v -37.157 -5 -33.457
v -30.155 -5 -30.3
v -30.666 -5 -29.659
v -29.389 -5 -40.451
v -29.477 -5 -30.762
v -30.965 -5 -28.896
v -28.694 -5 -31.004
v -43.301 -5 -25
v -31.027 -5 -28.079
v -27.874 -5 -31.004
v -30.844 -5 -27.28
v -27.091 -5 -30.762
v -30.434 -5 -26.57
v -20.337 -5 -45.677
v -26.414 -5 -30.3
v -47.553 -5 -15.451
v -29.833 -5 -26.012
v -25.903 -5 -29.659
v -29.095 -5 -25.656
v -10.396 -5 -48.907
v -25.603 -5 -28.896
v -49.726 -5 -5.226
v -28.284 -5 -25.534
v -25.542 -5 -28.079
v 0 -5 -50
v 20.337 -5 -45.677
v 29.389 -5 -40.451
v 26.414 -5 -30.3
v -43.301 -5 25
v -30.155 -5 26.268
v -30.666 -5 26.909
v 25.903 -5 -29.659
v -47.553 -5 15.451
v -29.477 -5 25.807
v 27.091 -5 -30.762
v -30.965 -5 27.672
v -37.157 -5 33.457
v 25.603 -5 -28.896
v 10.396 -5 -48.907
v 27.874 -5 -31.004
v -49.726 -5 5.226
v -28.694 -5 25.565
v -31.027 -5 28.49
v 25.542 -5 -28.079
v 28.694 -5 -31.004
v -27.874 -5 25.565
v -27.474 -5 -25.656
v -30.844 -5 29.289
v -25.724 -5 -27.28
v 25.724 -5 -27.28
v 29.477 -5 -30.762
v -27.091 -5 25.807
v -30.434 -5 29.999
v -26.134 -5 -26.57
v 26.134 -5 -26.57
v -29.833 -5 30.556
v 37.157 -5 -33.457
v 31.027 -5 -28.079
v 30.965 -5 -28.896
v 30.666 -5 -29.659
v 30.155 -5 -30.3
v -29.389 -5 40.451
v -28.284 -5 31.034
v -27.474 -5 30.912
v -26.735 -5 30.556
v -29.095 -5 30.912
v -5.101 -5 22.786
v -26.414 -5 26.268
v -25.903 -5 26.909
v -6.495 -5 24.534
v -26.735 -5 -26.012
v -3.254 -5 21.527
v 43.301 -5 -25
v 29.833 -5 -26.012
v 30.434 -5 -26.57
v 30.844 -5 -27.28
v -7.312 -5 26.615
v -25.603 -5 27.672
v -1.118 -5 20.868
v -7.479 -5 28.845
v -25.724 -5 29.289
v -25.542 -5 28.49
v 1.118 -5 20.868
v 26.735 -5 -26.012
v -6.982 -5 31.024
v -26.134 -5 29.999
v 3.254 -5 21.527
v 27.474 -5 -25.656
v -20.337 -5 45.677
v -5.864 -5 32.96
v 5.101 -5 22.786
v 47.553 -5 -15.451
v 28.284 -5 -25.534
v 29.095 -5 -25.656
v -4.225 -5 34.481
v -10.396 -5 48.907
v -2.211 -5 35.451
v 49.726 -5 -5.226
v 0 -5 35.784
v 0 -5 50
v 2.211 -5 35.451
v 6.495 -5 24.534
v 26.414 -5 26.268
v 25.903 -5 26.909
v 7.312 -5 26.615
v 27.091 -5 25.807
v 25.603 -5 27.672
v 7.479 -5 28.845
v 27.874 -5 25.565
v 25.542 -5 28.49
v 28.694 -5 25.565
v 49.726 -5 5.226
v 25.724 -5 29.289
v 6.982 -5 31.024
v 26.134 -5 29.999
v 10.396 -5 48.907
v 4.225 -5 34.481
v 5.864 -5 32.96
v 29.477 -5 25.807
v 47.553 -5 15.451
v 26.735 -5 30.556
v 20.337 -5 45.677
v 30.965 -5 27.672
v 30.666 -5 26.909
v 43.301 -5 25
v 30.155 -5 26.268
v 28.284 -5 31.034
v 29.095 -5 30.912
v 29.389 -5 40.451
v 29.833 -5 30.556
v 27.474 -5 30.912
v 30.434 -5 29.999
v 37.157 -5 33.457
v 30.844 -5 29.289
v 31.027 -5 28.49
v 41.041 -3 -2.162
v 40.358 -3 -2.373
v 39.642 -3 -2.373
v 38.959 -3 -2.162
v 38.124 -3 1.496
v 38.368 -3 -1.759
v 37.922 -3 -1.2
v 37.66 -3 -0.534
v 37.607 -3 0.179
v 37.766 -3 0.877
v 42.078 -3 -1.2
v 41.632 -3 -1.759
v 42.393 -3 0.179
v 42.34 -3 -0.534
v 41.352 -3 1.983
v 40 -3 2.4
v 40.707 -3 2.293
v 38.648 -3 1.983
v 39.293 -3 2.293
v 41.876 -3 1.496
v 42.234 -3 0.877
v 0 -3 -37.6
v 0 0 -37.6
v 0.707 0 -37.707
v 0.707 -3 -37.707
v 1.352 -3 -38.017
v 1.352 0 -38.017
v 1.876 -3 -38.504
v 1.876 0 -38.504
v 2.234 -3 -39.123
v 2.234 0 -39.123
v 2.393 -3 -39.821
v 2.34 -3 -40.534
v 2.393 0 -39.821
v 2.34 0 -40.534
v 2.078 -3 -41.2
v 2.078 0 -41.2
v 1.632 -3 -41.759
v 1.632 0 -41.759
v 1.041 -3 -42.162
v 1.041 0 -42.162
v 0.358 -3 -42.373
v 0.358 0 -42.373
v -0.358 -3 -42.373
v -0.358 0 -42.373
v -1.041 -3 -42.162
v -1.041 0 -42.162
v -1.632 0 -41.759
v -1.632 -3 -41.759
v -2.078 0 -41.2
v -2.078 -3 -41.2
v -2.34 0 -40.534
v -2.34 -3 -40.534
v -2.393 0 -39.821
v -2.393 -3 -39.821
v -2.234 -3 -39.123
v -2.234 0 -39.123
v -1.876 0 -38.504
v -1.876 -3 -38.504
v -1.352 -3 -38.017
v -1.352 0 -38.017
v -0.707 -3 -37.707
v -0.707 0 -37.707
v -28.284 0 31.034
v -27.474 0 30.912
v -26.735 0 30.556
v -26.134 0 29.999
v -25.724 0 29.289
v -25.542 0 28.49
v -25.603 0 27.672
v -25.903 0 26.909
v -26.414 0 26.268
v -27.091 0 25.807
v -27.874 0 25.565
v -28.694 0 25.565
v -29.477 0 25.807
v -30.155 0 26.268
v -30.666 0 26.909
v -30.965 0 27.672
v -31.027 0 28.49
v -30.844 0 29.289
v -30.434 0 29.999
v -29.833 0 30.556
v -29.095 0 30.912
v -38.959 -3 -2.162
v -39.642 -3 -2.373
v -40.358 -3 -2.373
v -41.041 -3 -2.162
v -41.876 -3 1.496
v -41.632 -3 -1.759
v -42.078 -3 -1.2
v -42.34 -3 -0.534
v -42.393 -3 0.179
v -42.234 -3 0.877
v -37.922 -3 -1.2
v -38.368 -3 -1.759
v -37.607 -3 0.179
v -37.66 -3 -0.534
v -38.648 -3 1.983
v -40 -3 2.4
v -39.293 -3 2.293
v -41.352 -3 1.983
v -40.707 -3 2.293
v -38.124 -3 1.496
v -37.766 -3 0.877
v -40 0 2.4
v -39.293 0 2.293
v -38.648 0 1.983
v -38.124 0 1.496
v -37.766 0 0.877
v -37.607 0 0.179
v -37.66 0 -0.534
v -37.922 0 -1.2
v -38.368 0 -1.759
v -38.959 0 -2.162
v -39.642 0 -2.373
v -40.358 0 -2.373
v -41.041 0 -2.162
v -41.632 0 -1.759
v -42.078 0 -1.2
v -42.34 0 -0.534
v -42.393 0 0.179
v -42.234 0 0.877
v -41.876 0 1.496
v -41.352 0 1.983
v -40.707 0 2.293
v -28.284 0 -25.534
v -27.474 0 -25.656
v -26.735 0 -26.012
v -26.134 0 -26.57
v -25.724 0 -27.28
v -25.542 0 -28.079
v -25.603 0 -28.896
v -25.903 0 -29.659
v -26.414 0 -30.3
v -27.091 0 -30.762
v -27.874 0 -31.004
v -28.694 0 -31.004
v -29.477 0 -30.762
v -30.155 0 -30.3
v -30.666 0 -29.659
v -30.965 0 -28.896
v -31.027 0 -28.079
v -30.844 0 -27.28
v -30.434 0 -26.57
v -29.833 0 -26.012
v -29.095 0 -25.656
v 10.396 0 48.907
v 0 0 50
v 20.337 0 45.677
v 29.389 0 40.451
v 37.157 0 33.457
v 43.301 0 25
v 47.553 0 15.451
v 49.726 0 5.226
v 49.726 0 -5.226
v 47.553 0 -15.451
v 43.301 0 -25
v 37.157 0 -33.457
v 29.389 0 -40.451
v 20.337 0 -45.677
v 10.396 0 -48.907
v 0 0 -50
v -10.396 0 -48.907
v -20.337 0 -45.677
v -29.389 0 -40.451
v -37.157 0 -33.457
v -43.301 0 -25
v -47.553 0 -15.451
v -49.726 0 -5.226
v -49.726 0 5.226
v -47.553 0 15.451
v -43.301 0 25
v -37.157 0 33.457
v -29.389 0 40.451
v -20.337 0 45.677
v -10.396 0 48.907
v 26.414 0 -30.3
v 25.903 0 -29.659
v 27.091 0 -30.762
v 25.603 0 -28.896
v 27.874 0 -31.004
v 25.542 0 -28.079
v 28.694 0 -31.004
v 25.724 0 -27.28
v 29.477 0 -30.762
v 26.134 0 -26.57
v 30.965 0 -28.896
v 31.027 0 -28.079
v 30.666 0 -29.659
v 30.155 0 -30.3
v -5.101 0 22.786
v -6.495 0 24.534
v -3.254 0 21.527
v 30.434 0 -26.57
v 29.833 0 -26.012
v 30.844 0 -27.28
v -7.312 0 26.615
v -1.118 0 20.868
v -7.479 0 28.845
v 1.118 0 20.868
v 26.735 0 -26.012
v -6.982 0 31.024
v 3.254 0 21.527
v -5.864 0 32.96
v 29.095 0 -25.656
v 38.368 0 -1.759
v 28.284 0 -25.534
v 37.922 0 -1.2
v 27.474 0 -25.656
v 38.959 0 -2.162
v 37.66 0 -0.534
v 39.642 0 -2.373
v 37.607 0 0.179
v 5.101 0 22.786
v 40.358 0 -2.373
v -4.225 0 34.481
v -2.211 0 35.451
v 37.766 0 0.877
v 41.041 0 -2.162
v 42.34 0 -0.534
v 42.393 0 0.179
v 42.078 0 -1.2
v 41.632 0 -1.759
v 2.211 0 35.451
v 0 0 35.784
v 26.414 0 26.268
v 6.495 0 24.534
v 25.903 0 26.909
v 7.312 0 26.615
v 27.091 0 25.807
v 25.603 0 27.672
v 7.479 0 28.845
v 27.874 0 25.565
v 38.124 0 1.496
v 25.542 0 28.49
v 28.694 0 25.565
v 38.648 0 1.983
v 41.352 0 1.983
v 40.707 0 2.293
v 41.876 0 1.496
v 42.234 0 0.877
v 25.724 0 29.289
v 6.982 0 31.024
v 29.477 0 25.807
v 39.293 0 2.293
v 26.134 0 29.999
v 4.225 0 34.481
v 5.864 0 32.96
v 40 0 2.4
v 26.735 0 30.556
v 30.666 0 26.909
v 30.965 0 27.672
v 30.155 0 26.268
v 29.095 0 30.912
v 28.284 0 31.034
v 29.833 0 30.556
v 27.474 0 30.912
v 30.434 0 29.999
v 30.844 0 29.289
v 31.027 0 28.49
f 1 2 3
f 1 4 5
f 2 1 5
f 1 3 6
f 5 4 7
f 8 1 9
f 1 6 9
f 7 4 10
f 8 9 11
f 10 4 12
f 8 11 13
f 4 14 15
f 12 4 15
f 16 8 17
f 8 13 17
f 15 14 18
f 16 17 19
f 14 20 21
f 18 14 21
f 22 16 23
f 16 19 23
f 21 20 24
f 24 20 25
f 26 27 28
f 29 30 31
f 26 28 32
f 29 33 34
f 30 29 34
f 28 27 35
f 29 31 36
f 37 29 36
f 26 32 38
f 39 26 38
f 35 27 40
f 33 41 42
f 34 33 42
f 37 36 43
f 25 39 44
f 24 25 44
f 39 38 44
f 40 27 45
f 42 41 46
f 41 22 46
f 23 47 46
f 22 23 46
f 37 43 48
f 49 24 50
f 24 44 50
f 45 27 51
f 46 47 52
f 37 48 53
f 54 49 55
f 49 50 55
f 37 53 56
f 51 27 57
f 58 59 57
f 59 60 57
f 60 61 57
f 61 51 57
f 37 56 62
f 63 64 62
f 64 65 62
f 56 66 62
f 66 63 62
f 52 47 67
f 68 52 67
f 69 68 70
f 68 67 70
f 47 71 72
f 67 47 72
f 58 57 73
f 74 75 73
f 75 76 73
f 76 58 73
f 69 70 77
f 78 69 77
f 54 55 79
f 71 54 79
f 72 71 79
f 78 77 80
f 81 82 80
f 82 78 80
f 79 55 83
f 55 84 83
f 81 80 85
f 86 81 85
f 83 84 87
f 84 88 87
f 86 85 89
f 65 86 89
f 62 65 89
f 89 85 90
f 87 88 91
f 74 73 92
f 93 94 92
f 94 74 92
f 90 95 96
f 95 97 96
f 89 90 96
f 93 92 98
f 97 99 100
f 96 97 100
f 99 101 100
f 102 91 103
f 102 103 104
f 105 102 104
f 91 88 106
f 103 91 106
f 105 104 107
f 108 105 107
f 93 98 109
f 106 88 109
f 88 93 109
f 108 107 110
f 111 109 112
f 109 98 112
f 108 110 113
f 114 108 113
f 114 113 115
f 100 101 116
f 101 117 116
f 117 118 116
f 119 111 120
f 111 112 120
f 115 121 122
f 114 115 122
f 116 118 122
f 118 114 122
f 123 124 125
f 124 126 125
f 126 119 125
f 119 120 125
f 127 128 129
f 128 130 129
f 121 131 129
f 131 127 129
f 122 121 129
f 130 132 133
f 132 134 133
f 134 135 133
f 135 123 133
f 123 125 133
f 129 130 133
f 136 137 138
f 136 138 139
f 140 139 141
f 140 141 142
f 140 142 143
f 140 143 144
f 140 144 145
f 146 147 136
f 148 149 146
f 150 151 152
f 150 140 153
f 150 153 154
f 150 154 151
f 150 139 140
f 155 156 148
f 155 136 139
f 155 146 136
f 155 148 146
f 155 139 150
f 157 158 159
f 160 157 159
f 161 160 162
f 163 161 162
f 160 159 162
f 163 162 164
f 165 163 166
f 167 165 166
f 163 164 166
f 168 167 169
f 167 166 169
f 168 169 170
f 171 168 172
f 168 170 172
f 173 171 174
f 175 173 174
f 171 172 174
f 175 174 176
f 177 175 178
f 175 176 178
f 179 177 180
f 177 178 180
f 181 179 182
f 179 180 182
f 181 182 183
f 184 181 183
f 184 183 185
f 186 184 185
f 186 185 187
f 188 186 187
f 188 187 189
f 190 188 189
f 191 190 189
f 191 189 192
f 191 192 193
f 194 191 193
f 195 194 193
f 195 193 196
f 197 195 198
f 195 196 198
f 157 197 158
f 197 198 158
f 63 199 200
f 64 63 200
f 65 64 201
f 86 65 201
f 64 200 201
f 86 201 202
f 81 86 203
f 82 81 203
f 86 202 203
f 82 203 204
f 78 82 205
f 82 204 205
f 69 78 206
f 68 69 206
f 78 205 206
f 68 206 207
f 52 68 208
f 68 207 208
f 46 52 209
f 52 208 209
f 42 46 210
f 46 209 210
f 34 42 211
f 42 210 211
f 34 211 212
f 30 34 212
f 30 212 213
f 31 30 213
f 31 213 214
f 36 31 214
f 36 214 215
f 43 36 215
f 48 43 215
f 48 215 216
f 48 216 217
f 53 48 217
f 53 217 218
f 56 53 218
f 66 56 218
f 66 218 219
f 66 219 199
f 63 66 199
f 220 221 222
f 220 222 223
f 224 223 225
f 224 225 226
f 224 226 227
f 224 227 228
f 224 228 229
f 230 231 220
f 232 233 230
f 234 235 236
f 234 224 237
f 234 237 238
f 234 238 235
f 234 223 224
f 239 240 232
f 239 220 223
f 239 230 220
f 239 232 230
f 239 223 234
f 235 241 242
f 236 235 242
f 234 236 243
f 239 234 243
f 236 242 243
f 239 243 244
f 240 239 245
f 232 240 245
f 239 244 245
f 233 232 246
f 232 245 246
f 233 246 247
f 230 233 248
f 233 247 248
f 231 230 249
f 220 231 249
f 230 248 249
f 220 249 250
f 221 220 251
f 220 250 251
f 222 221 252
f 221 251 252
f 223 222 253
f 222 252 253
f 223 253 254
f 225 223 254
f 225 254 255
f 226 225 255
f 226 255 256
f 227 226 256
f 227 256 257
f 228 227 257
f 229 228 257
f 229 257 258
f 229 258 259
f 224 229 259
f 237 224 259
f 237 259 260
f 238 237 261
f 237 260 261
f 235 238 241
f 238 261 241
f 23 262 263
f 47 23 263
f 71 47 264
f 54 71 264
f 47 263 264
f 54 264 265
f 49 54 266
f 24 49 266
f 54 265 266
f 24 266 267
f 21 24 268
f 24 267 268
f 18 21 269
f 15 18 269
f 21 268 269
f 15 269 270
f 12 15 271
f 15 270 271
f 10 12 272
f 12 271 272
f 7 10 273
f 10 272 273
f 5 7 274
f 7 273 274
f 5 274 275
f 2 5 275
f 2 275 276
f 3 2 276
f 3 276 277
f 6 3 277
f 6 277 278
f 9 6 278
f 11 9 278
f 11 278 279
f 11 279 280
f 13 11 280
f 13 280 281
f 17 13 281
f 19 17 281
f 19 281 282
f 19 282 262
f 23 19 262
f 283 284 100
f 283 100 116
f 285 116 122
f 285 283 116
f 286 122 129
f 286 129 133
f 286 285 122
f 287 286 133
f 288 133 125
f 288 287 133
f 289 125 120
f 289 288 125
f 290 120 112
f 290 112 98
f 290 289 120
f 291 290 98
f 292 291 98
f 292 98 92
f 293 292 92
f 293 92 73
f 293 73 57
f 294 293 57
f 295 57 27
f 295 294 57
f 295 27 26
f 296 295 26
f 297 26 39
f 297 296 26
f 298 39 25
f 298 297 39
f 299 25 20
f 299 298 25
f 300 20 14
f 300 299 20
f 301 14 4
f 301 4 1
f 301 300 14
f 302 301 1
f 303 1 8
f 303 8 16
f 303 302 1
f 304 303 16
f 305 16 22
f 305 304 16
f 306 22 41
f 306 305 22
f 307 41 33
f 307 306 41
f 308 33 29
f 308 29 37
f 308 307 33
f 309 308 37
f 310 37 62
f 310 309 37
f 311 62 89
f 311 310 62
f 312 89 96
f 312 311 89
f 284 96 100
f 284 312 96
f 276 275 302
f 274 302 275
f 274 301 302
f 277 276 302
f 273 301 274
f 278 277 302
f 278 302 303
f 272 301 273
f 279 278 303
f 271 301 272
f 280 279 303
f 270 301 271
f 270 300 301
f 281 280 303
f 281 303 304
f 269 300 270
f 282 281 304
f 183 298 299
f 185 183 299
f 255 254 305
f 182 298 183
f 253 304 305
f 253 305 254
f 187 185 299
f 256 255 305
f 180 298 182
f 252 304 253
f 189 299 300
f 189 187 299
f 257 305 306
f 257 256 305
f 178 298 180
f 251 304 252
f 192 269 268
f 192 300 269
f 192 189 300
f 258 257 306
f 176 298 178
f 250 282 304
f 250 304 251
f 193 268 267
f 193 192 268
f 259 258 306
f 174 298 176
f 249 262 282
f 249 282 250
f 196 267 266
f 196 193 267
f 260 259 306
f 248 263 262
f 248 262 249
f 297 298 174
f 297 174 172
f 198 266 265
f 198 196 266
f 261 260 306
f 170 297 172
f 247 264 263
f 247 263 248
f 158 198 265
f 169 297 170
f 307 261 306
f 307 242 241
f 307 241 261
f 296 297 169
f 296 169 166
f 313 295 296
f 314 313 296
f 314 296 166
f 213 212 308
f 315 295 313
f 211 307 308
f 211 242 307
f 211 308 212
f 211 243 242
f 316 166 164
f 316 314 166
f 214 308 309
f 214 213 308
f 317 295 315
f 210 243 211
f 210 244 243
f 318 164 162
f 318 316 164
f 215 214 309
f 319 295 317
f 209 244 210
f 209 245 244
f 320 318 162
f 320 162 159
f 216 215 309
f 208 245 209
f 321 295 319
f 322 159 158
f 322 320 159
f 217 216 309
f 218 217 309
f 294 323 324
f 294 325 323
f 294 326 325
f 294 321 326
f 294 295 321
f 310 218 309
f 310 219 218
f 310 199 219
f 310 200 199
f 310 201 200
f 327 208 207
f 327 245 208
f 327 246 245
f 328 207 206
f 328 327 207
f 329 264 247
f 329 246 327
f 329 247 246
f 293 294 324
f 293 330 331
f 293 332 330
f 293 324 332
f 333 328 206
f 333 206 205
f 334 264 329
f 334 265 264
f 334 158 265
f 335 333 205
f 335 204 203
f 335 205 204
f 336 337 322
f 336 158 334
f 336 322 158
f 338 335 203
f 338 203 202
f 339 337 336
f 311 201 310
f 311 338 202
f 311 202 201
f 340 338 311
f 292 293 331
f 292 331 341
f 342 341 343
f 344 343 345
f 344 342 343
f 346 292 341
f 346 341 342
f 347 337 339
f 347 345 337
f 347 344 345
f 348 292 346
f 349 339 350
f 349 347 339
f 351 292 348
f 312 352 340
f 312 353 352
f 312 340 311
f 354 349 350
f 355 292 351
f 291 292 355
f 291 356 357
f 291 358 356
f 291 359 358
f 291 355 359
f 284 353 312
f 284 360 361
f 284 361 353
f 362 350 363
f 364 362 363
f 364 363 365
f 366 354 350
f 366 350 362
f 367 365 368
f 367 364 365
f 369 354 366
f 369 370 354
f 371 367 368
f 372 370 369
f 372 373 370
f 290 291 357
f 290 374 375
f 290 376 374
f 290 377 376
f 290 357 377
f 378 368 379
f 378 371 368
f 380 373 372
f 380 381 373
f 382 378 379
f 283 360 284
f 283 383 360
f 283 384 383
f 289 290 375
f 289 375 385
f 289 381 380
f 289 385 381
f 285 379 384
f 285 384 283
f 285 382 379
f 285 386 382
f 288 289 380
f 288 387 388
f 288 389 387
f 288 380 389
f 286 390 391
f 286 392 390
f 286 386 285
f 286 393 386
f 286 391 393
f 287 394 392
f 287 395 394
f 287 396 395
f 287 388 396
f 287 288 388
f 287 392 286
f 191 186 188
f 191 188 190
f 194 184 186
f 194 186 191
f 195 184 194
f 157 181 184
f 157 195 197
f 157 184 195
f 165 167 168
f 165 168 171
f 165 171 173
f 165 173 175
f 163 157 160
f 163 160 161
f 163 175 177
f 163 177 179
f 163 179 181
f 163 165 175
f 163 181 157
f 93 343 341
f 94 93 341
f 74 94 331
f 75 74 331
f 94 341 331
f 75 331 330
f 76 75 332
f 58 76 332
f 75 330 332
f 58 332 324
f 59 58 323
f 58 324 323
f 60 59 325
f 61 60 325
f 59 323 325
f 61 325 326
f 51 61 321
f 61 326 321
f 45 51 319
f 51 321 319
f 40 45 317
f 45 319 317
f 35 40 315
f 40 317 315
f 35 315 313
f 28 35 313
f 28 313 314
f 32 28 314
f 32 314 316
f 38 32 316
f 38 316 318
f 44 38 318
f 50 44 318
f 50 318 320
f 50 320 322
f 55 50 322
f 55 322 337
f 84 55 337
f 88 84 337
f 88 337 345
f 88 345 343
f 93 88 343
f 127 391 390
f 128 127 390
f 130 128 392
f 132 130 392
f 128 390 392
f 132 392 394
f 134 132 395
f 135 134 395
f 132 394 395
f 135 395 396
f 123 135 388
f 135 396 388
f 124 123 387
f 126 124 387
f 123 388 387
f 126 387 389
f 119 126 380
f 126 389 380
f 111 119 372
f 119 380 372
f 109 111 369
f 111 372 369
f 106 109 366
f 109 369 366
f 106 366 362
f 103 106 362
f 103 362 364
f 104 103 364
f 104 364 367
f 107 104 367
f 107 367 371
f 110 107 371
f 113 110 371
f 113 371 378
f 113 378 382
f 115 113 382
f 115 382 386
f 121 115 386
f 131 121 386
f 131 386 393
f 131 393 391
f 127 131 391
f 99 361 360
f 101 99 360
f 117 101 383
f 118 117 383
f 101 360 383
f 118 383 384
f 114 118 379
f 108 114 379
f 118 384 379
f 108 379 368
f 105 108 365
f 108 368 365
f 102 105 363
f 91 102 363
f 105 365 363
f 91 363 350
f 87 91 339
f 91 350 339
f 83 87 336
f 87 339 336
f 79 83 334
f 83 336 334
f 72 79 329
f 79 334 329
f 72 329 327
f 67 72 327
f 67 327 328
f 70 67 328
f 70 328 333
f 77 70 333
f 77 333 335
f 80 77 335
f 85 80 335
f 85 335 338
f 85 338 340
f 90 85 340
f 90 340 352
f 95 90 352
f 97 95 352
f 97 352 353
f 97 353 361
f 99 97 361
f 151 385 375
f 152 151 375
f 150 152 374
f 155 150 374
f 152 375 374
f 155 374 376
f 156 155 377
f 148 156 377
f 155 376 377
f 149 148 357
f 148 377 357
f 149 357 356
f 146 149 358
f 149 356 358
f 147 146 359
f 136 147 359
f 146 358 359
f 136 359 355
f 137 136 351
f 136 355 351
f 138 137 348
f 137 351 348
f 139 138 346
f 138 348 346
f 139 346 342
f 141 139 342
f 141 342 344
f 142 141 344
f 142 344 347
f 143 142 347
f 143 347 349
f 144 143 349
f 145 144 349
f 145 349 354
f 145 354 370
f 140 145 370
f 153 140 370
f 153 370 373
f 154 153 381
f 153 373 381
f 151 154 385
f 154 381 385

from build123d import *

# Parameters (mm, degrees)
SKETCH_1_R          = 50
EXTRUDE_1_DEPTH     = 5
SKETCH_5_R          = 2.75
CUT_EXTRUDE_4_DEPTH = 24
SKETCH_6_R          = 7.5
CUT_EXTRUDE_5_DEPTH = 24
SKETCH_7_R          = 2.4
CUT_EXTRUDE_6_DEPTH = 3


with BuildPart() as part:
    # 草图1 → 凸台-拉伸1 (new body)
    with BuildSketch(Plane(origin=(0, 0, 0), x_dir=(1, 0, 0), z_dir=(0, 1, 0))):
        with Locations(Location((0, 0, 0), (0, 0, 270))):
            Circle(SKETCH_1_R)
    extrude(amount=-EXTRUDE_1_DEPTH)

    # 草图5 → 切除-拉伸4 (cut)
    with BuildSketch(Plane(origin=(0, 0, 0), x_dir=(1, 0, 0), z_dir=(0, 1, 0))):
        with Locations(Location((28.284271247, 28.284271247, 0), (0, 0, 270))):
            Circle(SKETCH_5_R)
        with Locations(Location((28.284271247, -28.284271247, 0), (0, 0, 270))):
            Circle(SKETCH_5_R)
        with Locations(Location((-28.284271247, -28.284271247, 0), (0, 0, 270))):
            Circle(SKETCH_5_R)
        with Locations(Location((-28.284271247, 28.284271247, 0), (0, 0, 270))):
            Circle(SKETCH_5_R)
    extrude(amount=-CUT_EXTRUDE_4_DEPTH, mode=Mode.SUBTRACT)

    # 草图6 → 切除-拉伸5 (cut)
    with BuildSketch(Plane(origin=(0, 0, 0), x_dir=(1, 0, 0), z_dir=(0, 1, 0))):
        with Locations(Location((0, -28.284271247, 0), (0, 0, 270))):
            Circle(SKETCH_6_R)
    extrude(amount=-CUT_EXTRUDE_5_DEPTH, mode=Mode.SUBTRACT)

    # 草图7 → 切除-拉伸6 (cut)
    with BuildSketch(Plane(origin=(0, 0, 0), x_dir=(1, 0, 0), z_dir=(0, 1, 0))):
        with Locations(Location((40, 0, 0), (0, 0, 270))):
            Circle(SKETCH_7_R)
        with Locations(Location((0, 40, 0), (0, 0, 270))):
            Circle(SKETCH_7_R)
        with Locations(Location((-40, 0, 0), (0, 0, 270))):
            Circle(SKETCH_7_R)
    extrude(amount=-CUT_EXTRUDE_6_DEPTH, mode=Mode.SUBTRACT)


solid = part.part
